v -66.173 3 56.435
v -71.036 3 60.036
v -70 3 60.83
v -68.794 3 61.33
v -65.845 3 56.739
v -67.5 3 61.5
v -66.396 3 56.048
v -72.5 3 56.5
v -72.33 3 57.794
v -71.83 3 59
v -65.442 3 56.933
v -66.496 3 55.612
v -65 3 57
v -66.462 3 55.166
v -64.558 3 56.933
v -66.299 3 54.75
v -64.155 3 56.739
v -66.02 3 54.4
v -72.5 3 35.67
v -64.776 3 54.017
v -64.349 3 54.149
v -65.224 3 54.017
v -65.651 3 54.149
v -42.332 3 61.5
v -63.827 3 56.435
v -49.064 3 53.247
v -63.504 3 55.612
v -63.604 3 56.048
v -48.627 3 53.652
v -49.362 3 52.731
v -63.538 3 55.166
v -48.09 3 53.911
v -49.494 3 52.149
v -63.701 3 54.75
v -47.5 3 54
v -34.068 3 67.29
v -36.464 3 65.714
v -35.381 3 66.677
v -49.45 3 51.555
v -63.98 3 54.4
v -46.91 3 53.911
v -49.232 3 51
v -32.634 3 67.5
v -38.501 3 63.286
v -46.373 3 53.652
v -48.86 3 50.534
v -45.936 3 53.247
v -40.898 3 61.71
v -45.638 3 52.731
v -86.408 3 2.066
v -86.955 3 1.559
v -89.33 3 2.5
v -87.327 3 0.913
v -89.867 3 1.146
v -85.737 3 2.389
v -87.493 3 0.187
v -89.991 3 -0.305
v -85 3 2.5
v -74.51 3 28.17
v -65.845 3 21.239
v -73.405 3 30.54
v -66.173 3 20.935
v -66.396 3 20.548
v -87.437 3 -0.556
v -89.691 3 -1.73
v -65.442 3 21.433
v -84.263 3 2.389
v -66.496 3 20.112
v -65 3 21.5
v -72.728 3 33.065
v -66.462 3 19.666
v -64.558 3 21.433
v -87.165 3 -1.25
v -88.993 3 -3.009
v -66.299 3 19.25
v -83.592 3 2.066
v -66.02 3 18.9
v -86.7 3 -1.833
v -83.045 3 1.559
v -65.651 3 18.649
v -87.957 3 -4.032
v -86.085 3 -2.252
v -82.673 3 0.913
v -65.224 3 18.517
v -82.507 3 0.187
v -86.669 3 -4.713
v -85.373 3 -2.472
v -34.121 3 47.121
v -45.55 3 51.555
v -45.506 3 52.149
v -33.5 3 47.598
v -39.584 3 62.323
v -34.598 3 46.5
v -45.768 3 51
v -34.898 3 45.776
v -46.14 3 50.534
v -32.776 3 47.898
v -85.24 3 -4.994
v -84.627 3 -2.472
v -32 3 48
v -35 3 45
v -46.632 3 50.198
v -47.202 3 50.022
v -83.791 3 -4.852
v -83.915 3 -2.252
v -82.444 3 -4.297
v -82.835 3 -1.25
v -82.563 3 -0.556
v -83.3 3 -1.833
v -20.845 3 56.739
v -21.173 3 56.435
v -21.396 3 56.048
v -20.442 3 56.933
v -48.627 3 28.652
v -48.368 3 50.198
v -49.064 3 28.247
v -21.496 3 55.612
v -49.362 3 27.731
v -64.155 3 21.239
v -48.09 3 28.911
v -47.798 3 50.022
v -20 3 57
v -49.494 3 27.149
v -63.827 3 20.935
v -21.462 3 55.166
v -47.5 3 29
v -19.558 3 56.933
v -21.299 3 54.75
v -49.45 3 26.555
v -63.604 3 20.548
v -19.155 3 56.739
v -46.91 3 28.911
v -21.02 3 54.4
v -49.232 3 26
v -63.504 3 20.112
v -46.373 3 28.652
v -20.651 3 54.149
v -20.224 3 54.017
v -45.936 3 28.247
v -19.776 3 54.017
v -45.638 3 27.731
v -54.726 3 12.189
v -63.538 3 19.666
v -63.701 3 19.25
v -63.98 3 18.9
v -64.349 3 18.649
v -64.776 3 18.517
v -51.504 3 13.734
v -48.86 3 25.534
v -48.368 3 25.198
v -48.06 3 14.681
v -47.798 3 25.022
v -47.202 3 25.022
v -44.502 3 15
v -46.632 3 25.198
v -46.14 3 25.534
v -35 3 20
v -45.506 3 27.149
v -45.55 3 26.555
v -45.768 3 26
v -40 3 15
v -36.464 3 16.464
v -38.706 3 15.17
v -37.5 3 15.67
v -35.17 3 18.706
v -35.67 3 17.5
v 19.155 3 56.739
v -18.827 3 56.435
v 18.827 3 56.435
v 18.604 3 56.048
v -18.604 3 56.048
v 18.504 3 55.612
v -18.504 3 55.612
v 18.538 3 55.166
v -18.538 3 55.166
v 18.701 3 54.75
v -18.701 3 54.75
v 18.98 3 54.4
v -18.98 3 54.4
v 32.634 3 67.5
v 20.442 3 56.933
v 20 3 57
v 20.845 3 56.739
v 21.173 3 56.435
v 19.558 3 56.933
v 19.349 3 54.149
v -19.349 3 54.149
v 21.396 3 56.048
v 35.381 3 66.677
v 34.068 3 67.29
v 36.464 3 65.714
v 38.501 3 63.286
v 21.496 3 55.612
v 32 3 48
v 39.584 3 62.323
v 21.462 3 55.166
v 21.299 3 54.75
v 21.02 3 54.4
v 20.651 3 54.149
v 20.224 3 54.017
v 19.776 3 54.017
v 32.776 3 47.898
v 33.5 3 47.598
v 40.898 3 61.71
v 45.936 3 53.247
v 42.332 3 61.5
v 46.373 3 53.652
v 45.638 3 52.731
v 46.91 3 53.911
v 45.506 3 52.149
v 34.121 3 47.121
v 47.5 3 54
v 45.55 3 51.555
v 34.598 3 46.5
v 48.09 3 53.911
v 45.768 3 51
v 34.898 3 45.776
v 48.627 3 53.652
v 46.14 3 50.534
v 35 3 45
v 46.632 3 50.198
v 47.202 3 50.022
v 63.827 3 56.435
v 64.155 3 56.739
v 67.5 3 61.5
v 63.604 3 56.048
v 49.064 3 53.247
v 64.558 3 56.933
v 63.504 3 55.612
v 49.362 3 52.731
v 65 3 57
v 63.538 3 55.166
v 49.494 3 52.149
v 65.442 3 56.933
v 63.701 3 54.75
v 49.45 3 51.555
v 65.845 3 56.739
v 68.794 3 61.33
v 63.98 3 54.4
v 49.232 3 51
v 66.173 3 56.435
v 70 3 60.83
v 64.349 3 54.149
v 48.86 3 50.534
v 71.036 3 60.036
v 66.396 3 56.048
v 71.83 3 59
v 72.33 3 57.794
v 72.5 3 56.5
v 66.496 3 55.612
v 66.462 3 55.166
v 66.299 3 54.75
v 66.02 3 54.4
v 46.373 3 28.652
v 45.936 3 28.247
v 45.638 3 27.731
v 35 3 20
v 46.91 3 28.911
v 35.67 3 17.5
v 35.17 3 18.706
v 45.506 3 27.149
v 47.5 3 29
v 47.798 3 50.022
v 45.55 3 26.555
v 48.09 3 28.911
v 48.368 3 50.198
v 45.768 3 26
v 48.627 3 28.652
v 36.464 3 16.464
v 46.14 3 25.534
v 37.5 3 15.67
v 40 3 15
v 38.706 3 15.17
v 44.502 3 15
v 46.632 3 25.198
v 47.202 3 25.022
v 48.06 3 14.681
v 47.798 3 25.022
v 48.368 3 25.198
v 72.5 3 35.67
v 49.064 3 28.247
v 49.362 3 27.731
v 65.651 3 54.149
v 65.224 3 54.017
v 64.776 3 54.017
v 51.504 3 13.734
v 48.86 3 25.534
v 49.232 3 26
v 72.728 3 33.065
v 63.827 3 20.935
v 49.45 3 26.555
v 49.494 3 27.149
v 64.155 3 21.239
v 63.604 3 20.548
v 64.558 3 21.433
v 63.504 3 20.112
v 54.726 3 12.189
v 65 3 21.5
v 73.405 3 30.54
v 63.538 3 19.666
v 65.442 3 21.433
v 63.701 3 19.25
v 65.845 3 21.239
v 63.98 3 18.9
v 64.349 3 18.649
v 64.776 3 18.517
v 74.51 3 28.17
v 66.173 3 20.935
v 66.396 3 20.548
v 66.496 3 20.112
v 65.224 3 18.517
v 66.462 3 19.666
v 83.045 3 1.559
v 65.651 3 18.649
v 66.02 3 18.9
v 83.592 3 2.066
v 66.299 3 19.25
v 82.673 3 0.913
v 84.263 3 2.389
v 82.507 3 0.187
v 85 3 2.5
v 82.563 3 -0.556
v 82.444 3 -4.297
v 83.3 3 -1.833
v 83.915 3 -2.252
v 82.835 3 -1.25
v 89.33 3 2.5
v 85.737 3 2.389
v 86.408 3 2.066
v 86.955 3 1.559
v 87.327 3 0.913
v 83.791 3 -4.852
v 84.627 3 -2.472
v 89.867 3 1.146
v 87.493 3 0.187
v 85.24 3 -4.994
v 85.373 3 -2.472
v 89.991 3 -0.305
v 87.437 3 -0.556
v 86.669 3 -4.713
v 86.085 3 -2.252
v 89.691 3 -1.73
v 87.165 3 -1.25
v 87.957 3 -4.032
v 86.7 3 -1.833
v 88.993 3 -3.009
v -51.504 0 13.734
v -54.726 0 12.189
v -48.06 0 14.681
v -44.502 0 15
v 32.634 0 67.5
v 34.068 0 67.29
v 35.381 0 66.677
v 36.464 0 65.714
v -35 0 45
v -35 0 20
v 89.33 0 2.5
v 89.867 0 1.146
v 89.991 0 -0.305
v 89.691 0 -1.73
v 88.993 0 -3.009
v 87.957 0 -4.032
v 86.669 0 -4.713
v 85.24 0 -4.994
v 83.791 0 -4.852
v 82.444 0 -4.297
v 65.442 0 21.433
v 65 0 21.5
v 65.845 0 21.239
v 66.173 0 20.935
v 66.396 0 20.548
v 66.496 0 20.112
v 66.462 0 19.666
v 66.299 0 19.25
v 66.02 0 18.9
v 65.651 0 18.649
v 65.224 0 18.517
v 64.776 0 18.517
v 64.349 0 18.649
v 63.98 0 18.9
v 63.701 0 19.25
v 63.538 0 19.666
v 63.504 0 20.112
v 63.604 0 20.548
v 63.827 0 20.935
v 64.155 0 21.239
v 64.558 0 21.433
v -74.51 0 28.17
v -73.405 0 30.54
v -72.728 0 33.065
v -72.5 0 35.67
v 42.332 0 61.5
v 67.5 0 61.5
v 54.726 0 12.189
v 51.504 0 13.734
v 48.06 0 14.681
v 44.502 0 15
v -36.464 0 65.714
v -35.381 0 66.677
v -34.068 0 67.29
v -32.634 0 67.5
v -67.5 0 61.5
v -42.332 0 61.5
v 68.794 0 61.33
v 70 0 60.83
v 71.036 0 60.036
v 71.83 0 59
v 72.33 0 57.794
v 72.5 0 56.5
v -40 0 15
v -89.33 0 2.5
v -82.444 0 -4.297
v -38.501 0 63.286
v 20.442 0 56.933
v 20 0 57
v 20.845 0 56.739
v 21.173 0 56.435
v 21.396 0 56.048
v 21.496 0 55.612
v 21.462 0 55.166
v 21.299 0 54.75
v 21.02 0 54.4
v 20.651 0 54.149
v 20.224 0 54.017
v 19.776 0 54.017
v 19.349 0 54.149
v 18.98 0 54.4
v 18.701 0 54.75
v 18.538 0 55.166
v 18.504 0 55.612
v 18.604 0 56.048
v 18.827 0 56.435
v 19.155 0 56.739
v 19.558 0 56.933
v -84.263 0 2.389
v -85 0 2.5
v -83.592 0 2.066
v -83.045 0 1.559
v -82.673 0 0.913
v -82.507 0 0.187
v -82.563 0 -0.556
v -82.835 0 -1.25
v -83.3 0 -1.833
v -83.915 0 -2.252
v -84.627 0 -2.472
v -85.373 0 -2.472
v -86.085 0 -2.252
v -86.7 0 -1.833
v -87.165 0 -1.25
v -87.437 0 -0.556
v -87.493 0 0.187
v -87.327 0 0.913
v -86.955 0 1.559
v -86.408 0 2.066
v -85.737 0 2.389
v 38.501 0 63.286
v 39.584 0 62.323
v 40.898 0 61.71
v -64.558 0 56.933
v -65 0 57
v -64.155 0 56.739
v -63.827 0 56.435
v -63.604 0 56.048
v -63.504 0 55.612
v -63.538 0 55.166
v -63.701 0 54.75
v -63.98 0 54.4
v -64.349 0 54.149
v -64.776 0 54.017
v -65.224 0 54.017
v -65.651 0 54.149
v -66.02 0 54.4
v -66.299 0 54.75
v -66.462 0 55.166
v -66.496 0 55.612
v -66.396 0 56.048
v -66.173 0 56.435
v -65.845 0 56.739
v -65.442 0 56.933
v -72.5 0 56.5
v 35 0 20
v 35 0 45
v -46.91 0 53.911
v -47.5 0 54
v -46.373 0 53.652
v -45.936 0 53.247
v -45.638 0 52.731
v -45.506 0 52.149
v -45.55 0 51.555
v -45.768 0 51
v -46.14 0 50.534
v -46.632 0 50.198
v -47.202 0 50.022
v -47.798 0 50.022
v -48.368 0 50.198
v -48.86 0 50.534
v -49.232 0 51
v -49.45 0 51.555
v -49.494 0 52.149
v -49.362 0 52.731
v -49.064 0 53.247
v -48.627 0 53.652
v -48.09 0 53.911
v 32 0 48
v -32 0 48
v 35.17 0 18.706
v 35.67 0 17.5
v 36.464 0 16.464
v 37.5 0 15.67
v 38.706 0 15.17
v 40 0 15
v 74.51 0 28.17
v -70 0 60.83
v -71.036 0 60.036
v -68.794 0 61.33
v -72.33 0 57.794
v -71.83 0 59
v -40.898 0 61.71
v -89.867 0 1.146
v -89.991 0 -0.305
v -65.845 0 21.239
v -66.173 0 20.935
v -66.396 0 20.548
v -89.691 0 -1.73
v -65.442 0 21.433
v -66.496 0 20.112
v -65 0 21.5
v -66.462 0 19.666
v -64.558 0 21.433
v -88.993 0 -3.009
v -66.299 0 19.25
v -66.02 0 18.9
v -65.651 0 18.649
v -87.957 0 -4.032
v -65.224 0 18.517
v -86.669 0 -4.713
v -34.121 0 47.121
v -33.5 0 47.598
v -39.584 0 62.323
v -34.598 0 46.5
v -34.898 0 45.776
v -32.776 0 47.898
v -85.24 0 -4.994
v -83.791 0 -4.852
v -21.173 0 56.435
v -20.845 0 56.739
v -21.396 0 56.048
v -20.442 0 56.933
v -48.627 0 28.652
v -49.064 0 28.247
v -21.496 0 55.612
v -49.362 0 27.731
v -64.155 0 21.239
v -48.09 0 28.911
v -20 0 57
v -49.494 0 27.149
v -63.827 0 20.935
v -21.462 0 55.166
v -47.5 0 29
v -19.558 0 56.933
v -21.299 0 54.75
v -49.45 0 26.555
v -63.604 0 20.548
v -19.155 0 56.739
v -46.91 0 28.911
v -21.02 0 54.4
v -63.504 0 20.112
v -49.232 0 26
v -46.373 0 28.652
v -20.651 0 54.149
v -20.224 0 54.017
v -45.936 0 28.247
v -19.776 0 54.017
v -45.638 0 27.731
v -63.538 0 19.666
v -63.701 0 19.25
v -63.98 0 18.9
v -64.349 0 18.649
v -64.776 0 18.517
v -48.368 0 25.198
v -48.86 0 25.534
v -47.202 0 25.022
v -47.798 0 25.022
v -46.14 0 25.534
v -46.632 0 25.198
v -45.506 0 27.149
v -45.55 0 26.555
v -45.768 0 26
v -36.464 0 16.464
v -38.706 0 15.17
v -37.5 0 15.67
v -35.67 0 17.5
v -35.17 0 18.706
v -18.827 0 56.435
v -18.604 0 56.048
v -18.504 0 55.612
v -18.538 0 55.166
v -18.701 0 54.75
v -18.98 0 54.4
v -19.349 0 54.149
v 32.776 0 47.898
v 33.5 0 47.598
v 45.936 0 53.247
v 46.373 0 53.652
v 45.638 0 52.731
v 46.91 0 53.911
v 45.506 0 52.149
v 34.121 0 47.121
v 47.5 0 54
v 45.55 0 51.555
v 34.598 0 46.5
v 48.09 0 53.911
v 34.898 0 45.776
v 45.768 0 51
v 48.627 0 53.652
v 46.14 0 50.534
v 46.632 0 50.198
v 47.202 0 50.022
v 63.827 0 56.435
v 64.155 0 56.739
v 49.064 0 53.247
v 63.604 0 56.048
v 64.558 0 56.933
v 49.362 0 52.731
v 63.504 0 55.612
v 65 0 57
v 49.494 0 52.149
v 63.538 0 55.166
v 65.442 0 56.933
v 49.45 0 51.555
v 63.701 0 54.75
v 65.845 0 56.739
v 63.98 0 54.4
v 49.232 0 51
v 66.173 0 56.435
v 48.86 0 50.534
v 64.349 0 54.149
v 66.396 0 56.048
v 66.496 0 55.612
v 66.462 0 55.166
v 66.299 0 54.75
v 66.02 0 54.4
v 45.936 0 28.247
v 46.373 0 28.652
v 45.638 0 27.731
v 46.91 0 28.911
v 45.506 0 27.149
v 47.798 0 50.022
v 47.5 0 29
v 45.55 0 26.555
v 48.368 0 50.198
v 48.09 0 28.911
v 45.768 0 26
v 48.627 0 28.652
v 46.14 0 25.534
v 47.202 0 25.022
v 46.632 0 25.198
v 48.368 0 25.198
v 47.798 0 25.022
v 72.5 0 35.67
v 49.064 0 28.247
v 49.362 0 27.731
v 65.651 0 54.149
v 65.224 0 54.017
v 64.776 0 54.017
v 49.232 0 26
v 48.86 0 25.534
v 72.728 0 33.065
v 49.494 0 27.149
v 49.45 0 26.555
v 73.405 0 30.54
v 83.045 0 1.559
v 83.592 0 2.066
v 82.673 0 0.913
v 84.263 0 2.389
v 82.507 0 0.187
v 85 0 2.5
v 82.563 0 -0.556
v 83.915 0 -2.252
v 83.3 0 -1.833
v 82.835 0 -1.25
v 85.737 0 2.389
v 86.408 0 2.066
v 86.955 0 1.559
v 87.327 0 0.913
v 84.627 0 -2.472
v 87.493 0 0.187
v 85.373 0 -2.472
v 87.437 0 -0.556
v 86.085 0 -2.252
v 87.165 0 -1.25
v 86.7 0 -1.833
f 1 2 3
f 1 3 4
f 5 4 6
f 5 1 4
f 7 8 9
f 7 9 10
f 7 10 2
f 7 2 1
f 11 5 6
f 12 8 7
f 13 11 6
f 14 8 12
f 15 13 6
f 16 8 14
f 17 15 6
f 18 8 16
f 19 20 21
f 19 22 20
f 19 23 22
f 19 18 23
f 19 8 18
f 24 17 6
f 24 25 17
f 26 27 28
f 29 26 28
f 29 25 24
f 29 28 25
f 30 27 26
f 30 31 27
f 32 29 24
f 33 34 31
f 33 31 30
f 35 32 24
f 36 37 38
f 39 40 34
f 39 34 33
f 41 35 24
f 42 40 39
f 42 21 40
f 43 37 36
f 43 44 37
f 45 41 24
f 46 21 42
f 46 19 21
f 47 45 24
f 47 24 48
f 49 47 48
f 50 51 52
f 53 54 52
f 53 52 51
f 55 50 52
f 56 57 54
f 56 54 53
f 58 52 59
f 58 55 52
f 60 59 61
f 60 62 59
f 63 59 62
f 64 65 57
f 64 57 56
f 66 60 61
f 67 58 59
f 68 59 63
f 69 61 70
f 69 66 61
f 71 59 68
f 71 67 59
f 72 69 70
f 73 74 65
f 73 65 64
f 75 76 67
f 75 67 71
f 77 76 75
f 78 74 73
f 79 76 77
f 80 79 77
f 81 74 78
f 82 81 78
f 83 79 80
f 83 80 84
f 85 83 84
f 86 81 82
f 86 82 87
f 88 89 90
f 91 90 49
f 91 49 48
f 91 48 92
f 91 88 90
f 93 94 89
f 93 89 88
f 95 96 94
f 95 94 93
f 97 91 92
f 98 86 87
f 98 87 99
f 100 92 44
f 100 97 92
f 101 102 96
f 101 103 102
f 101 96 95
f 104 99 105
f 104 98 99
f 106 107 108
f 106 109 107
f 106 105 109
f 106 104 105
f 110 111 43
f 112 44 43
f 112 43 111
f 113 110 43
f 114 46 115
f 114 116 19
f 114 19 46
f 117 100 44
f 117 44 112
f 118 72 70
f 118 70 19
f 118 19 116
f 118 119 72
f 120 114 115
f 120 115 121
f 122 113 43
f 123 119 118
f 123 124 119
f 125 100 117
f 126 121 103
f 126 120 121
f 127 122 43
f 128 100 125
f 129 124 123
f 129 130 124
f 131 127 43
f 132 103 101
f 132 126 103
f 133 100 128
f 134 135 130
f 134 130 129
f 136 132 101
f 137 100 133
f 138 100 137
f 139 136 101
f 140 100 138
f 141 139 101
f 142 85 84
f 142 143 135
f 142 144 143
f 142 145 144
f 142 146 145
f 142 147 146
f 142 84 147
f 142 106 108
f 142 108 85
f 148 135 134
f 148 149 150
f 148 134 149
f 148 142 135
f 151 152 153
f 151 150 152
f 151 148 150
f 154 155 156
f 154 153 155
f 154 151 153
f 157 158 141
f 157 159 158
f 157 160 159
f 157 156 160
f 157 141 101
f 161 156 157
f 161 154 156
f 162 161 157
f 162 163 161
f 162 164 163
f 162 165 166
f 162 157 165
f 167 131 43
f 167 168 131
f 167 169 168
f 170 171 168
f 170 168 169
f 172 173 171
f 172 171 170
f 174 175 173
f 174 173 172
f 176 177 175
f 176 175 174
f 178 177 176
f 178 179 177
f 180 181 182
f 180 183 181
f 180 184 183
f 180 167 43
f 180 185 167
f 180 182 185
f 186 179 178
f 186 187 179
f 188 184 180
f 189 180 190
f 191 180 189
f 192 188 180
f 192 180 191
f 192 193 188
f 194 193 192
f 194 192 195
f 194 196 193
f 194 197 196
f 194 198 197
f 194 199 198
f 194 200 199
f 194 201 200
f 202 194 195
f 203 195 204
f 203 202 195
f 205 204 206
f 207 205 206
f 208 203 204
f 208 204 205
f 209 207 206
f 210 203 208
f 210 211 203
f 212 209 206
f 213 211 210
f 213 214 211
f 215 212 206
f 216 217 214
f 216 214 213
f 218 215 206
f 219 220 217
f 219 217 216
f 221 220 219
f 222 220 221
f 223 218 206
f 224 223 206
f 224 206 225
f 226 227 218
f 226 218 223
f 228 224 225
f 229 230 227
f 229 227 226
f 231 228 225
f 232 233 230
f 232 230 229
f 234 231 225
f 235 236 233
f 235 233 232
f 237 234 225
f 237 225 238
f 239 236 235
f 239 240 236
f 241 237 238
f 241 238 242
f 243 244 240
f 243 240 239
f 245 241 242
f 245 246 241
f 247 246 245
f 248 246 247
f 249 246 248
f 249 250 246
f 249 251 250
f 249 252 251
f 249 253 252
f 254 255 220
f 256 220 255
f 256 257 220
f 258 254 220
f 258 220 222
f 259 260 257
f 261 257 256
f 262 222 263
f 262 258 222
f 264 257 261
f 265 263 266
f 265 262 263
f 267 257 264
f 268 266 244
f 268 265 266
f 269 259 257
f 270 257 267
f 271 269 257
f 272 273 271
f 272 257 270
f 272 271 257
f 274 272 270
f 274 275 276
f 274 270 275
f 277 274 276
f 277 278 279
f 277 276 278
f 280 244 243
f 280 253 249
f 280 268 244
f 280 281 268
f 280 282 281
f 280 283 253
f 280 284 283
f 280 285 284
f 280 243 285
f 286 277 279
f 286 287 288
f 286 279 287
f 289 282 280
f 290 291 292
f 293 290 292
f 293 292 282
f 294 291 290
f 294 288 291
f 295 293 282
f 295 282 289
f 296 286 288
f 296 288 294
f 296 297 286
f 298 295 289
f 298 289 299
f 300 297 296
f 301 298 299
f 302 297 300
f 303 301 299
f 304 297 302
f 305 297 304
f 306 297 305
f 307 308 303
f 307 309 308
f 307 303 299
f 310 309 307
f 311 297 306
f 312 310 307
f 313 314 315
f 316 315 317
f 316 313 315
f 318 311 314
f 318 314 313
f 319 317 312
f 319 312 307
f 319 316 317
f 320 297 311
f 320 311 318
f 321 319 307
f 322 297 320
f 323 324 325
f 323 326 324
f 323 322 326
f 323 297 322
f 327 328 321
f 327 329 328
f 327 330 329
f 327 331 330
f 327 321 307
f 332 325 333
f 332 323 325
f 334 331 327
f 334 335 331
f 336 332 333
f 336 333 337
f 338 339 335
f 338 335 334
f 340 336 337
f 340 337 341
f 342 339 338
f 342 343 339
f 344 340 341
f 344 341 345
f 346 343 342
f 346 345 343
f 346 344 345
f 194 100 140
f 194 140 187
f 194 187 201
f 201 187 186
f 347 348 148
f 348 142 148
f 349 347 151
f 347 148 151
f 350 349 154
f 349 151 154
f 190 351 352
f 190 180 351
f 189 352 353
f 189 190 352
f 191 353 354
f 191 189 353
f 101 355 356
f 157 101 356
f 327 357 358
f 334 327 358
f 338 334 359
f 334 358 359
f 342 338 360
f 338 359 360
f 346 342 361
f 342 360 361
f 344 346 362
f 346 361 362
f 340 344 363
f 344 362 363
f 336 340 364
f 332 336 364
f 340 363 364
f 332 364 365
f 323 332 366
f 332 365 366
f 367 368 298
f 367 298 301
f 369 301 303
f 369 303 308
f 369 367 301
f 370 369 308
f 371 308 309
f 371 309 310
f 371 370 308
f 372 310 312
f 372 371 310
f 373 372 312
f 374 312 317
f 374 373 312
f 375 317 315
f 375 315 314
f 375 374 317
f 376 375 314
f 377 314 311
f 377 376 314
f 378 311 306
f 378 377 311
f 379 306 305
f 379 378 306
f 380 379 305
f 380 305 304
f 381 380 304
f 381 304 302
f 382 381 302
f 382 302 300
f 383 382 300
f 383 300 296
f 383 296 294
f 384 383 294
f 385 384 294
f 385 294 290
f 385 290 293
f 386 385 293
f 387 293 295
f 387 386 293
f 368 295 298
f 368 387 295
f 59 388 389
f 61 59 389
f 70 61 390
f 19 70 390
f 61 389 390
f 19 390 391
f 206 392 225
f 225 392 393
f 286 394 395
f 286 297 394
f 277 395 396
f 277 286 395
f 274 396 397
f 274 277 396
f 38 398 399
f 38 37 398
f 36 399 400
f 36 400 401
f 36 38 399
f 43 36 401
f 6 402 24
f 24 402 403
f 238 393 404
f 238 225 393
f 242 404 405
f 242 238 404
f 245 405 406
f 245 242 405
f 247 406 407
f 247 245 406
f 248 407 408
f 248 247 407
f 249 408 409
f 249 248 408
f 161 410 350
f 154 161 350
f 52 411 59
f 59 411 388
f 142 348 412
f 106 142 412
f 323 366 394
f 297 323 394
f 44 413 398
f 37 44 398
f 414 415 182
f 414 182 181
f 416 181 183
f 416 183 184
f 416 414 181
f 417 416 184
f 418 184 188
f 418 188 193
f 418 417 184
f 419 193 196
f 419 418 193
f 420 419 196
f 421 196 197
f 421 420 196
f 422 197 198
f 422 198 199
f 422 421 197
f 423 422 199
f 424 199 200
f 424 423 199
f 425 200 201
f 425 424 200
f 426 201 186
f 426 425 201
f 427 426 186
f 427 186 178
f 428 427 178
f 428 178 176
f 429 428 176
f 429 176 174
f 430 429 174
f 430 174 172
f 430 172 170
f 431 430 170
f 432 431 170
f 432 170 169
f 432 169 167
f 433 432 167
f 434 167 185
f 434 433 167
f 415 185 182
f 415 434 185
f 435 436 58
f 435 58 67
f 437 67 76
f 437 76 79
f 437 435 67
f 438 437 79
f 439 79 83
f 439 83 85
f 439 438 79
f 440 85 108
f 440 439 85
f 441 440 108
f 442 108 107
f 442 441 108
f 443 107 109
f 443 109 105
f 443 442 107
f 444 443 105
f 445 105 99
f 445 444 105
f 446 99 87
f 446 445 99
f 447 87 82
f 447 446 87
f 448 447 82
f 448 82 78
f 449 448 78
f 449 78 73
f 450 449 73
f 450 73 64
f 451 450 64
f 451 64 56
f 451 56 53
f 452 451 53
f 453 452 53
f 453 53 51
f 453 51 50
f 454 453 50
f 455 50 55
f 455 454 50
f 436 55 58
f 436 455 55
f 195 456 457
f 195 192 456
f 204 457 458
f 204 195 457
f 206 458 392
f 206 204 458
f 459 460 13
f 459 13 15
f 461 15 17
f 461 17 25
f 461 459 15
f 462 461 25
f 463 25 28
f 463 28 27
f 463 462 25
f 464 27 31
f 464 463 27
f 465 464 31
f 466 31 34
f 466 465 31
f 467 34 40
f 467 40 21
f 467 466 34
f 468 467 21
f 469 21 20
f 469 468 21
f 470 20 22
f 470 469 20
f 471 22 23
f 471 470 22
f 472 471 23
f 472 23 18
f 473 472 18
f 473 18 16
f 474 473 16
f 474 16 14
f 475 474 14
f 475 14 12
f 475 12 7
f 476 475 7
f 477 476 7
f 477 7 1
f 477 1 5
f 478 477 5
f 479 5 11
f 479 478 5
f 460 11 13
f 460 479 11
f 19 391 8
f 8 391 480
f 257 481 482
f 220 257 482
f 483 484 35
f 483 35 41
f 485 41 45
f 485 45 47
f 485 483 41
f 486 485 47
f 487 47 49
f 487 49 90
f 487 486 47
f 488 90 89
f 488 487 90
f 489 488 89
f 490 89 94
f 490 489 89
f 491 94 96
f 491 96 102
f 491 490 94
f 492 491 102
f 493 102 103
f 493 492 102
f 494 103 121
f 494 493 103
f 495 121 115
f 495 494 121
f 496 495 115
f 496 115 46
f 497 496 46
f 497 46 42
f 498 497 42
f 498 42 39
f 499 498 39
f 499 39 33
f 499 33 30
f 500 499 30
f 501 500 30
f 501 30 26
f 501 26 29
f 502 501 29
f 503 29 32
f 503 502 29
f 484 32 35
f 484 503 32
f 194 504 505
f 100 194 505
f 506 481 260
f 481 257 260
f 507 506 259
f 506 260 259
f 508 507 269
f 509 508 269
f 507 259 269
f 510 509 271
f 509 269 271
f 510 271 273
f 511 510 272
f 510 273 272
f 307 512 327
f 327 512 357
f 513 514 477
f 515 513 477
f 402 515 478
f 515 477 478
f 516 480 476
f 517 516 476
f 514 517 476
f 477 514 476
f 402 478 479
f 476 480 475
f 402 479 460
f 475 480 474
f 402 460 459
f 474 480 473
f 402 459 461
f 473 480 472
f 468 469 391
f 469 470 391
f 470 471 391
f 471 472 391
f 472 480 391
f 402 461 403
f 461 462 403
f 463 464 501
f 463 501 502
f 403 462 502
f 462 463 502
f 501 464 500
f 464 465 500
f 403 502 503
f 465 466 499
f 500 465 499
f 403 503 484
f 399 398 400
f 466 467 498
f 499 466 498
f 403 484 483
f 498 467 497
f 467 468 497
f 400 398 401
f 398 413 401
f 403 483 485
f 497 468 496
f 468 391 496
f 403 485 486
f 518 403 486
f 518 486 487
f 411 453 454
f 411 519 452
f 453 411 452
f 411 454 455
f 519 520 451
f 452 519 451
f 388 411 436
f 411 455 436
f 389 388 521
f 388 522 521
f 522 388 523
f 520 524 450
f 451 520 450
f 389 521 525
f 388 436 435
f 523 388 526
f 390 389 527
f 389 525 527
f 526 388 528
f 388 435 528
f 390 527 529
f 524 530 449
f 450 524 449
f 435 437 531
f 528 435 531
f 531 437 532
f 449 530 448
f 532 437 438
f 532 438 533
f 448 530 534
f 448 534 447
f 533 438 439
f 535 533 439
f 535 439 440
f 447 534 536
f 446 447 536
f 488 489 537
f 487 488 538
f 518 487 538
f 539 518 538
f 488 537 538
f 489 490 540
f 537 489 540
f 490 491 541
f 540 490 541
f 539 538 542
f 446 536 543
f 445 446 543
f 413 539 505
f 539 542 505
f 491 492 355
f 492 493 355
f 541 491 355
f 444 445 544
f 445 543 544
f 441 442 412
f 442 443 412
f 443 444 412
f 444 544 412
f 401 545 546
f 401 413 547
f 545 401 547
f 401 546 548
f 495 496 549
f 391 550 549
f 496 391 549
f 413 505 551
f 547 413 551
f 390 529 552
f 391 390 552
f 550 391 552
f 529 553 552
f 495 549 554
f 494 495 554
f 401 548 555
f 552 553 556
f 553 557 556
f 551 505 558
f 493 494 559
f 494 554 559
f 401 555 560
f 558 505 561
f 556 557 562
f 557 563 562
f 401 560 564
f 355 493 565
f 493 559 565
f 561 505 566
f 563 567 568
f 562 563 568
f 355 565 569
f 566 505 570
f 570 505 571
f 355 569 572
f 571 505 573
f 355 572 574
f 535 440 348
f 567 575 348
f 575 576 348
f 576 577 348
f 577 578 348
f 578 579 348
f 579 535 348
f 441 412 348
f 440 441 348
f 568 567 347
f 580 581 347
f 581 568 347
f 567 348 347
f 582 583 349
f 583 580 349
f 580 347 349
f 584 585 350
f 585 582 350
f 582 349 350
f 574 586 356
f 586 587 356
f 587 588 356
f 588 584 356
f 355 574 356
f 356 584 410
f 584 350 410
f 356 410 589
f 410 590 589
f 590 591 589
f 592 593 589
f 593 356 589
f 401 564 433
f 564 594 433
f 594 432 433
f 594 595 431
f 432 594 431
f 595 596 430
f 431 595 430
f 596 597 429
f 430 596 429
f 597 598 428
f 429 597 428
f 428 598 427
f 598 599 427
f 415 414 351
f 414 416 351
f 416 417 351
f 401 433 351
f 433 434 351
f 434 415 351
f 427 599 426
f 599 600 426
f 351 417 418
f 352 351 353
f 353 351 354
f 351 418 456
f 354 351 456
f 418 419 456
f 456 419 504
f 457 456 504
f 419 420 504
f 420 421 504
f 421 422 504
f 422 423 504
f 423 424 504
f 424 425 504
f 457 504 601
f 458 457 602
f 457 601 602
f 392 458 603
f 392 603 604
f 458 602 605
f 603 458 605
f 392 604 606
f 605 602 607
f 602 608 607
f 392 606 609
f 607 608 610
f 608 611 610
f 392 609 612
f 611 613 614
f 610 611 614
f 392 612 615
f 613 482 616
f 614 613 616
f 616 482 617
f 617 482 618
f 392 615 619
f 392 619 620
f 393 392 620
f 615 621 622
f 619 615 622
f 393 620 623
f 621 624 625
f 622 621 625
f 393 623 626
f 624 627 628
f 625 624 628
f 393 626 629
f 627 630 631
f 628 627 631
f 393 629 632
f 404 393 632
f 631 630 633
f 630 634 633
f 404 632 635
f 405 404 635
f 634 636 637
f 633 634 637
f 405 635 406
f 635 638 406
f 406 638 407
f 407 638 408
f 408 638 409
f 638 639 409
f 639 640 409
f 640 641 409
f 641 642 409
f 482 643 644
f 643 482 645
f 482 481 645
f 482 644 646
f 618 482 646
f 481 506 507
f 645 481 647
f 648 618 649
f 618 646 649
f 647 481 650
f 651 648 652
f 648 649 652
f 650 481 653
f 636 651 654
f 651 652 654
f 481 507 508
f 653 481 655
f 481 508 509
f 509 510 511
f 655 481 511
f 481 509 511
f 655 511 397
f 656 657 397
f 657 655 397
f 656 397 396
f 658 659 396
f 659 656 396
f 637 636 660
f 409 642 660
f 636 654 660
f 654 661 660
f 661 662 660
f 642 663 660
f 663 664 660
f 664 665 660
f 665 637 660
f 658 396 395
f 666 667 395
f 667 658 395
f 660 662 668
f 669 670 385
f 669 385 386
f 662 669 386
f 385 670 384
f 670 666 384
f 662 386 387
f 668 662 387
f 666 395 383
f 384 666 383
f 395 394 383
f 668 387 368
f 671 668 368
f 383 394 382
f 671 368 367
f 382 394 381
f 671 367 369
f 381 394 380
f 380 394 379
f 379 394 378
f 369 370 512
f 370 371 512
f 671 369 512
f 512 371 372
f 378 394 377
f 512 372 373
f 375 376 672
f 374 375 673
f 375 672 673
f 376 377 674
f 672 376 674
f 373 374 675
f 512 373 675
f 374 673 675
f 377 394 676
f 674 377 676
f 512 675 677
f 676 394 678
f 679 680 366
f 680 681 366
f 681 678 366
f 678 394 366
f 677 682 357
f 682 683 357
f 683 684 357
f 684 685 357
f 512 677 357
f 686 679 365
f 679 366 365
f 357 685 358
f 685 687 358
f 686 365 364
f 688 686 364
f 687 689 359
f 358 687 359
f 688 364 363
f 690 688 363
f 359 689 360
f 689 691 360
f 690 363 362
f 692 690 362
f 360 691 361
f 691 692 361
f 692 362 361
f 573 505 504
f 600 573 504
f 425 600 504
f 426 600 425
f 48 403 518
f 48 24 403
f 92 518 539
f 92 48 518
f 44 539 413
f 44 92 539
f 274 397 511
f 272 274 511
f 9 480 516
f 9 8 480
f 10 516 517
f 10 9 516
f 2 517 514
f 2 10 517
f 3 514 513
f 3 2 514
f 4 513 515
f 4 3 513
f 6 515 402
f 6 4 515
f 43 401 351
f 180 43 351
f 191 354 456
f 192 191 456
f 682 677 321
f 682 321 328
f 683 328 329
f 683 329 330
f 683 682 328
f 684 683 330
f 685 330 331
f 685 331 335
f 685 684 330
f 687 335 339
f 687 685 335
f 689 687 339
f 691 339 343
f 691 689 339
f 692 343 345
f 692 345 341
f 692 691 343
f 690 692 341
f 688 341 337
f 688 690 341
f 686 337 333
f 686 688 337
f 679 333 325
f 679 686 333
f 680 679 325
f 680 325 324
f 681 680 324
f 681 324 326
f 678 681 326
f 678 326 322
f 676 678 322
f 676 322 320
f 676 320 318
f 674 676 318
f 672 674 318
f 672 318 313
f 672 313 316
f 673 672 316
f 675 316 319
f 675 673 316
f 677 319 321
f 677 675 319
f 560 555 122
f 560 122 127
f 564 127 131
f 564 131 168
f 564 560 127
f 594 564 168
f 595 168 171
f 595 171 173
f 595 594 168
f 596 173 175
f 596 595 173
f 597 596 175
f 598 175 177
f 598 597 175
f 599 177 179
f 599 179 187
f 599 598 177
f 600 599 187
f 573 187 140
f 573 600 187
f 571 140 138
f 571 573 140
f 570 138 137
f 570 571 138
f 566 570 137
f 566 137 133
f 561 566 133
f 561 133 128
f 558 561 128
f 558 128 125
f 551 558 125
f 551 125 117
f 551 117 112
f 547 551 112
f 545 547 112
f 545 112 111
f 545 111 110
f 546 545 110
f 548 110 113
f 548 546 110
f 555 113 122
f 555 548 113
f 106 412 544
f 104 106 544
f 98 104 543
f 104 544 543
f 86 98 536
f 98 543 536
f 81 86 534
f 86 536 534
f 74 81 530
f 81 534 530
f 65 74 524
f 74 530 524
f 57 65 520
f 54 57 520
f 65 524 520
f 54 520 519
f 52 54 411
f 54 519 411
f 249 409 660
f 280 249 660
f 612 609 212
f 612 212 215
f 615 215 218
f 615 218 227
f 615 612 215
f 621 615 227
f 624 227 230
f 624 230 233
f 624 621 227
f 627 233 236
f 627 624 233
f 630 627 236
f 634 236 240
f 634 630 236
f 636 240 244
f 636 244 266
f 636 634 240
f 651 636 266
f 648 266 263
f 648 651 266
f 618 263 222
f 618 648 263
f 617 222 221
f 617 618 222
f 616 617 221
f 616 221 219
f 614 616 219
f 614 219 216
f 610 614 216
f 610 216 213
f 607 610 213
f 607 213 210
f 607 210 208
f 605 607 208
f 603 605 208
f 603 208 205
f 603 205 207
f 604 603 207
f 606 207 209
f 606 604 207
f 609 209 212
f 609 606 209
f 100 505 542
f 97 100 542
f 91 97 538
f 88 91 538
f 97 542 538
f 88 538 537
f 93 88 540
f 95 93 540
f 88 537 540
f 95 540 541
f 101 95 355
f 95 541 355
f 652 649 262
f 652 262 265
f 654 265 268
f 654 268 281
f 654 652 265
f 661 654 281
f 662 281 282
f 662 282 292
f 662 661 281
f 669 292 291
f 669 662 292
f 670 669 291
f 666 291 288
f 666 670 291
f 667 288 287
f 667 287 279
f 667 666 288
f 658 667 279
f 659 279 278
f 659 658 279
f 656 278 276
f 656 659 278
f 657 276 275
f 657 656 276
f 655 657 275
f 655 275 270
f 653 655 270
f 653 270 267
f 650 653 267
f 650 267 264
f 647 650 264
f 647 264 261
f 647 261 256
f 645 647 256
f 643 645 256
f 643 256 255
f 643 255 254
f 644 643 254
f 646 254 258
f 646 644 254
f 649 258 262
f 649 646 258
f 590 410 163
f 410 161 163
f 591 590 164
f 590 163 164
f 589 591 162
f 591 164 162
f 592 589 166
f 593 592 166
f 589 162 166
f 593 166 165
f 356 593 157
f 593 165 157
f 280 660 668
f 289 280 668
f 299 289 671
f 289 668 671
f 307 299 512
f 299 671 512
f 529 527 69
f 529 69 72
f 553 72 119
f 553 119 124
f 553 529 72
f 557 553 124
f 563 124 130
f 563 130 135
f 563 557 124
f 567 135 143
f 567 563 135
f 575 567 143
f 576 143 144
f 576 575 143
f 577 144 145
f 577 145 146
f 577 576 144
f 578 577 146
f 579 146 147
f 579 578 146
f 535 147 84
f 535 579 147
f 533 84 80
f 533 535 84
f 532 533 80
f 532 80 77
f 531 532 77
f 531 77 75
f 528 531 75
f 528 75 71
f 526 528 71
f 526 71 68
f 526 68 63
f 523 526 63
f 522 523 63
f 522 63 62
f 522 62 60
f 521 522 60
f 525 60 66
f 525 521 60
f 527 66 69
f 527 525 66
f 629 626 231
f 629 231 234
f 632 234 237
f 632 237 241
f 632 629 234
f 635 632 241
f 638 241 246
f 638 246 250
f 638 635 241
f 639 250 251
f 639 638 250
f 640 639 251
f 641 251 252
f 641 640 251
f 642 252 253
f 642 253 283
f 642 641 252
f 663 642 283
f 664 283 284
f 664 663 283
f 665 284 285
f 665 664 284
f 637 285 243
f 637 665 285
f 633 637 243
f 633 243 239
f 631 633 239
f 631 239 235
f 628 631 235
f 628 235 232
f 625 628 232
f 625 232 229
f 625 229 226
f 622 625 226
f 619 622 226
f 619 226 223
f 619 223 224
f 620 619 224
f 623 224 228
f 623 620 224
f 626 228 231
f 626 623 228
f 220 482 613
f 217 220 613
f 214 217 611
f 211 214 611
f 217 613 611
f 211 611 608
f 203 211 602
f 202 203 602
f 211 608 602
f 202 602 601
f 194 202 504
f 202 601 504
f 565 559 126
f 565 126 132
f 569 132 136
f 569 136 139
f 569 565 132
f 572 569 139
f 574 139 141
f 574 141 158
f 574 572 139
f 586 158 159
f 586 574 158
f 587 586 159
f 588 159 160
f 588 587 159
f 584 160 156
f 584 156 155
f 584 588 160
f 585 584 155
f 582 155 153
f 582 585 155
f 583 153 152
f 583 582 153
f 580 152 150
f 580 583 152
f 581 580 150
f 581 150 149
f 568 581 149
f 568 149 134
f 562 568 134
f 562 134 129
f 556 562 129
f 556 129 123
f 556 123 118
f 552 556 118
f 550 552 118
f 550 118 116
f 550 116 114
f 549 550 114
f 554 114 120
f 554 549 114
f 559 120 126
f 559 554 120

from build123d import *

# Parameters (mm, degrees)
SKETCH_1_R      = 2.5
SKETCH_1_R_2    = 2
SKETCH_1_R_3    = 1.5
EXTRUDE_1_DEPTH = 3
FILLET_1_R      = 20
FILLET_2_R      = 5


with BuildPart() as part:
    # 草图1 → 凸台-拉伸1 (new body)
    with BuildSketch(Plane(origin=(0, 0, 0), x_dir=(1, 0, 0), z_dir=(0, 1, 0))):
        with BuildLine():
            Line((-72.5, -61.5), (-40, -61.5))
            Line((-40, -61.5), (-34.965402213, -67.5))
            Line((-34.965402213, -67.5), (34.965402213, -67.5))
            Line((34.965402213, -67.5), (40, -61.5))
            Line((40, -61.5), (72.5, -61.5))
            Line((72.5, -61.5), (72.5, -35.669872981))
            ThreePointArc((72.5, -35.669872981), (73.011112606, -31.787587305), (74.509618943, -28.169872981))
            Line((74.509618943, -28.169872981), (89.330127019, -2.5))
            ThreePointArc((89.330127019, -2.5), (88.512514494, 3.558404408), (82.444008336, 4.297313883))
            Line((82.444008336, 4.297313883), (50, -15))
            Line((50, -15), (35, -15))
            Line((35, -15), (35, -45))
            ThreePointArc((35, -45), (34.121320344, -47.121320344), (32, -48))
            Line((32, -48), (-32, -48))
            ThreePointArc((-32, -48), (-34.121320344, -47.121320344), (-35, -45))
            Line((-35, -45), (-35, -15))
            Line((-35, -15), (-50, -15))
            Line((-50, -15), (-82.444008336, 4.297313883))
            ThreePointArc((-82.444008336, 4.297313883), (-88.512514494, 3.558404408), (-89.330127019, -2.5))
            Line((-89.330127019, -2.5), (-74.509618943, -28.169872981))
            ThreePointArc((-74.509618943, -28.169872981), (-73.011112606, -31.787587305), (-72.5, -35.669872981))
            Line((-72.5, -35.669872981), (-72.5, -61.5))
        make_face()
        with Locations(Location((85, 0, 0), (0, 0, 270))):
            Circle(SKETCH_1_R, mode=Mode.SUBTRACT)
        with Locations(Location((-85, 0, 0), (0, 0, 270))):
            Circle(SKETCH_1_R, mode=Mode.SUBTRACT)
        with Locations(Location((47.5, -27, 0), (0, 0, 270))):
            Circle(SKETCH_1_R_2, mode=Mode.SUBTRACT)
        with Locations(Location((47.5, -52, 0), (0, 0, 270))):
            Circle(SKETCH_1_R_2, mode=Mode.SUBTRACT)
        with Locations(Location((-47.5, -52, 0), (0, 0, 270))):
            Circle(SKETCH_1_R_2, mode=Mode.SUBTRACT)
        with Locations(Location((-47.5, -27, 0), (0, 0, 270))):
            Circle(SKETCH_1_R_2, mode=Mode.SUBTRACT)
        with Locations(Location((-20, -55.5, 0), (0, 0, 270))):
            Circle(SKETCH_1_R_3, mode=Mode.SUBTRACT)
        with Locations(Location((20, -55.5, 0), (0, 0, 270))):
            Circle(SKETCH_1_R_3, mode=Mode.SUBTRACT)
        with Locations(Location((65, -55.5, 0), (0, 0, 270))):
            Circle(SKETCH_1_R_3, mode=Mode.SUBTRACT)
        with Locations(Location((-65, -55.5, 0), (0, 0, 270))):
            Circle(SKETCH_1_R_3, mode=Mode.SUBTRACT)
        with Locations(Location((65, -20, 0), (0, 0, 270))):
            Circle(SKETCH_1_R_3, mode=Mode.SUBTRACT)
        with Locations(Location((-65, -20, 0), (0, 0, 270))):
            Circle(SKETCH_1_R_3, mode=Mode.SUBTRACT)
    extrude(amount=EXTRUDE_1_DEPTH)

    # 圆角1
    fillet_1_edges = [part.edges().sort_by_distance(p)[0] for p in [
        (50, 1.5, 15),
        (-50, 1.5, 15),
    ]]
    fillet(fillet_1_edges, radius=FILLET_1_R)

    # 圆角2
    fillet_2_edges = [part.edges().sort_by_distance(p)[0] for p in [
        (-35, 1.5, 15),
        (35, 1.5, 15),
        (72.5, 1.5, 61.5),
        (40, 1.5, 61.5),
        (34.965402213, 1.5, 67.5),
        (-34.965402213, 1.5, 67.5),
        (-40, 1.5, 61.5),
        (-72.5, 1.5, 61.5),
    ]]
    fillet(fillet_2_edges, radius=FILLET_2_R)


solid = part.part
